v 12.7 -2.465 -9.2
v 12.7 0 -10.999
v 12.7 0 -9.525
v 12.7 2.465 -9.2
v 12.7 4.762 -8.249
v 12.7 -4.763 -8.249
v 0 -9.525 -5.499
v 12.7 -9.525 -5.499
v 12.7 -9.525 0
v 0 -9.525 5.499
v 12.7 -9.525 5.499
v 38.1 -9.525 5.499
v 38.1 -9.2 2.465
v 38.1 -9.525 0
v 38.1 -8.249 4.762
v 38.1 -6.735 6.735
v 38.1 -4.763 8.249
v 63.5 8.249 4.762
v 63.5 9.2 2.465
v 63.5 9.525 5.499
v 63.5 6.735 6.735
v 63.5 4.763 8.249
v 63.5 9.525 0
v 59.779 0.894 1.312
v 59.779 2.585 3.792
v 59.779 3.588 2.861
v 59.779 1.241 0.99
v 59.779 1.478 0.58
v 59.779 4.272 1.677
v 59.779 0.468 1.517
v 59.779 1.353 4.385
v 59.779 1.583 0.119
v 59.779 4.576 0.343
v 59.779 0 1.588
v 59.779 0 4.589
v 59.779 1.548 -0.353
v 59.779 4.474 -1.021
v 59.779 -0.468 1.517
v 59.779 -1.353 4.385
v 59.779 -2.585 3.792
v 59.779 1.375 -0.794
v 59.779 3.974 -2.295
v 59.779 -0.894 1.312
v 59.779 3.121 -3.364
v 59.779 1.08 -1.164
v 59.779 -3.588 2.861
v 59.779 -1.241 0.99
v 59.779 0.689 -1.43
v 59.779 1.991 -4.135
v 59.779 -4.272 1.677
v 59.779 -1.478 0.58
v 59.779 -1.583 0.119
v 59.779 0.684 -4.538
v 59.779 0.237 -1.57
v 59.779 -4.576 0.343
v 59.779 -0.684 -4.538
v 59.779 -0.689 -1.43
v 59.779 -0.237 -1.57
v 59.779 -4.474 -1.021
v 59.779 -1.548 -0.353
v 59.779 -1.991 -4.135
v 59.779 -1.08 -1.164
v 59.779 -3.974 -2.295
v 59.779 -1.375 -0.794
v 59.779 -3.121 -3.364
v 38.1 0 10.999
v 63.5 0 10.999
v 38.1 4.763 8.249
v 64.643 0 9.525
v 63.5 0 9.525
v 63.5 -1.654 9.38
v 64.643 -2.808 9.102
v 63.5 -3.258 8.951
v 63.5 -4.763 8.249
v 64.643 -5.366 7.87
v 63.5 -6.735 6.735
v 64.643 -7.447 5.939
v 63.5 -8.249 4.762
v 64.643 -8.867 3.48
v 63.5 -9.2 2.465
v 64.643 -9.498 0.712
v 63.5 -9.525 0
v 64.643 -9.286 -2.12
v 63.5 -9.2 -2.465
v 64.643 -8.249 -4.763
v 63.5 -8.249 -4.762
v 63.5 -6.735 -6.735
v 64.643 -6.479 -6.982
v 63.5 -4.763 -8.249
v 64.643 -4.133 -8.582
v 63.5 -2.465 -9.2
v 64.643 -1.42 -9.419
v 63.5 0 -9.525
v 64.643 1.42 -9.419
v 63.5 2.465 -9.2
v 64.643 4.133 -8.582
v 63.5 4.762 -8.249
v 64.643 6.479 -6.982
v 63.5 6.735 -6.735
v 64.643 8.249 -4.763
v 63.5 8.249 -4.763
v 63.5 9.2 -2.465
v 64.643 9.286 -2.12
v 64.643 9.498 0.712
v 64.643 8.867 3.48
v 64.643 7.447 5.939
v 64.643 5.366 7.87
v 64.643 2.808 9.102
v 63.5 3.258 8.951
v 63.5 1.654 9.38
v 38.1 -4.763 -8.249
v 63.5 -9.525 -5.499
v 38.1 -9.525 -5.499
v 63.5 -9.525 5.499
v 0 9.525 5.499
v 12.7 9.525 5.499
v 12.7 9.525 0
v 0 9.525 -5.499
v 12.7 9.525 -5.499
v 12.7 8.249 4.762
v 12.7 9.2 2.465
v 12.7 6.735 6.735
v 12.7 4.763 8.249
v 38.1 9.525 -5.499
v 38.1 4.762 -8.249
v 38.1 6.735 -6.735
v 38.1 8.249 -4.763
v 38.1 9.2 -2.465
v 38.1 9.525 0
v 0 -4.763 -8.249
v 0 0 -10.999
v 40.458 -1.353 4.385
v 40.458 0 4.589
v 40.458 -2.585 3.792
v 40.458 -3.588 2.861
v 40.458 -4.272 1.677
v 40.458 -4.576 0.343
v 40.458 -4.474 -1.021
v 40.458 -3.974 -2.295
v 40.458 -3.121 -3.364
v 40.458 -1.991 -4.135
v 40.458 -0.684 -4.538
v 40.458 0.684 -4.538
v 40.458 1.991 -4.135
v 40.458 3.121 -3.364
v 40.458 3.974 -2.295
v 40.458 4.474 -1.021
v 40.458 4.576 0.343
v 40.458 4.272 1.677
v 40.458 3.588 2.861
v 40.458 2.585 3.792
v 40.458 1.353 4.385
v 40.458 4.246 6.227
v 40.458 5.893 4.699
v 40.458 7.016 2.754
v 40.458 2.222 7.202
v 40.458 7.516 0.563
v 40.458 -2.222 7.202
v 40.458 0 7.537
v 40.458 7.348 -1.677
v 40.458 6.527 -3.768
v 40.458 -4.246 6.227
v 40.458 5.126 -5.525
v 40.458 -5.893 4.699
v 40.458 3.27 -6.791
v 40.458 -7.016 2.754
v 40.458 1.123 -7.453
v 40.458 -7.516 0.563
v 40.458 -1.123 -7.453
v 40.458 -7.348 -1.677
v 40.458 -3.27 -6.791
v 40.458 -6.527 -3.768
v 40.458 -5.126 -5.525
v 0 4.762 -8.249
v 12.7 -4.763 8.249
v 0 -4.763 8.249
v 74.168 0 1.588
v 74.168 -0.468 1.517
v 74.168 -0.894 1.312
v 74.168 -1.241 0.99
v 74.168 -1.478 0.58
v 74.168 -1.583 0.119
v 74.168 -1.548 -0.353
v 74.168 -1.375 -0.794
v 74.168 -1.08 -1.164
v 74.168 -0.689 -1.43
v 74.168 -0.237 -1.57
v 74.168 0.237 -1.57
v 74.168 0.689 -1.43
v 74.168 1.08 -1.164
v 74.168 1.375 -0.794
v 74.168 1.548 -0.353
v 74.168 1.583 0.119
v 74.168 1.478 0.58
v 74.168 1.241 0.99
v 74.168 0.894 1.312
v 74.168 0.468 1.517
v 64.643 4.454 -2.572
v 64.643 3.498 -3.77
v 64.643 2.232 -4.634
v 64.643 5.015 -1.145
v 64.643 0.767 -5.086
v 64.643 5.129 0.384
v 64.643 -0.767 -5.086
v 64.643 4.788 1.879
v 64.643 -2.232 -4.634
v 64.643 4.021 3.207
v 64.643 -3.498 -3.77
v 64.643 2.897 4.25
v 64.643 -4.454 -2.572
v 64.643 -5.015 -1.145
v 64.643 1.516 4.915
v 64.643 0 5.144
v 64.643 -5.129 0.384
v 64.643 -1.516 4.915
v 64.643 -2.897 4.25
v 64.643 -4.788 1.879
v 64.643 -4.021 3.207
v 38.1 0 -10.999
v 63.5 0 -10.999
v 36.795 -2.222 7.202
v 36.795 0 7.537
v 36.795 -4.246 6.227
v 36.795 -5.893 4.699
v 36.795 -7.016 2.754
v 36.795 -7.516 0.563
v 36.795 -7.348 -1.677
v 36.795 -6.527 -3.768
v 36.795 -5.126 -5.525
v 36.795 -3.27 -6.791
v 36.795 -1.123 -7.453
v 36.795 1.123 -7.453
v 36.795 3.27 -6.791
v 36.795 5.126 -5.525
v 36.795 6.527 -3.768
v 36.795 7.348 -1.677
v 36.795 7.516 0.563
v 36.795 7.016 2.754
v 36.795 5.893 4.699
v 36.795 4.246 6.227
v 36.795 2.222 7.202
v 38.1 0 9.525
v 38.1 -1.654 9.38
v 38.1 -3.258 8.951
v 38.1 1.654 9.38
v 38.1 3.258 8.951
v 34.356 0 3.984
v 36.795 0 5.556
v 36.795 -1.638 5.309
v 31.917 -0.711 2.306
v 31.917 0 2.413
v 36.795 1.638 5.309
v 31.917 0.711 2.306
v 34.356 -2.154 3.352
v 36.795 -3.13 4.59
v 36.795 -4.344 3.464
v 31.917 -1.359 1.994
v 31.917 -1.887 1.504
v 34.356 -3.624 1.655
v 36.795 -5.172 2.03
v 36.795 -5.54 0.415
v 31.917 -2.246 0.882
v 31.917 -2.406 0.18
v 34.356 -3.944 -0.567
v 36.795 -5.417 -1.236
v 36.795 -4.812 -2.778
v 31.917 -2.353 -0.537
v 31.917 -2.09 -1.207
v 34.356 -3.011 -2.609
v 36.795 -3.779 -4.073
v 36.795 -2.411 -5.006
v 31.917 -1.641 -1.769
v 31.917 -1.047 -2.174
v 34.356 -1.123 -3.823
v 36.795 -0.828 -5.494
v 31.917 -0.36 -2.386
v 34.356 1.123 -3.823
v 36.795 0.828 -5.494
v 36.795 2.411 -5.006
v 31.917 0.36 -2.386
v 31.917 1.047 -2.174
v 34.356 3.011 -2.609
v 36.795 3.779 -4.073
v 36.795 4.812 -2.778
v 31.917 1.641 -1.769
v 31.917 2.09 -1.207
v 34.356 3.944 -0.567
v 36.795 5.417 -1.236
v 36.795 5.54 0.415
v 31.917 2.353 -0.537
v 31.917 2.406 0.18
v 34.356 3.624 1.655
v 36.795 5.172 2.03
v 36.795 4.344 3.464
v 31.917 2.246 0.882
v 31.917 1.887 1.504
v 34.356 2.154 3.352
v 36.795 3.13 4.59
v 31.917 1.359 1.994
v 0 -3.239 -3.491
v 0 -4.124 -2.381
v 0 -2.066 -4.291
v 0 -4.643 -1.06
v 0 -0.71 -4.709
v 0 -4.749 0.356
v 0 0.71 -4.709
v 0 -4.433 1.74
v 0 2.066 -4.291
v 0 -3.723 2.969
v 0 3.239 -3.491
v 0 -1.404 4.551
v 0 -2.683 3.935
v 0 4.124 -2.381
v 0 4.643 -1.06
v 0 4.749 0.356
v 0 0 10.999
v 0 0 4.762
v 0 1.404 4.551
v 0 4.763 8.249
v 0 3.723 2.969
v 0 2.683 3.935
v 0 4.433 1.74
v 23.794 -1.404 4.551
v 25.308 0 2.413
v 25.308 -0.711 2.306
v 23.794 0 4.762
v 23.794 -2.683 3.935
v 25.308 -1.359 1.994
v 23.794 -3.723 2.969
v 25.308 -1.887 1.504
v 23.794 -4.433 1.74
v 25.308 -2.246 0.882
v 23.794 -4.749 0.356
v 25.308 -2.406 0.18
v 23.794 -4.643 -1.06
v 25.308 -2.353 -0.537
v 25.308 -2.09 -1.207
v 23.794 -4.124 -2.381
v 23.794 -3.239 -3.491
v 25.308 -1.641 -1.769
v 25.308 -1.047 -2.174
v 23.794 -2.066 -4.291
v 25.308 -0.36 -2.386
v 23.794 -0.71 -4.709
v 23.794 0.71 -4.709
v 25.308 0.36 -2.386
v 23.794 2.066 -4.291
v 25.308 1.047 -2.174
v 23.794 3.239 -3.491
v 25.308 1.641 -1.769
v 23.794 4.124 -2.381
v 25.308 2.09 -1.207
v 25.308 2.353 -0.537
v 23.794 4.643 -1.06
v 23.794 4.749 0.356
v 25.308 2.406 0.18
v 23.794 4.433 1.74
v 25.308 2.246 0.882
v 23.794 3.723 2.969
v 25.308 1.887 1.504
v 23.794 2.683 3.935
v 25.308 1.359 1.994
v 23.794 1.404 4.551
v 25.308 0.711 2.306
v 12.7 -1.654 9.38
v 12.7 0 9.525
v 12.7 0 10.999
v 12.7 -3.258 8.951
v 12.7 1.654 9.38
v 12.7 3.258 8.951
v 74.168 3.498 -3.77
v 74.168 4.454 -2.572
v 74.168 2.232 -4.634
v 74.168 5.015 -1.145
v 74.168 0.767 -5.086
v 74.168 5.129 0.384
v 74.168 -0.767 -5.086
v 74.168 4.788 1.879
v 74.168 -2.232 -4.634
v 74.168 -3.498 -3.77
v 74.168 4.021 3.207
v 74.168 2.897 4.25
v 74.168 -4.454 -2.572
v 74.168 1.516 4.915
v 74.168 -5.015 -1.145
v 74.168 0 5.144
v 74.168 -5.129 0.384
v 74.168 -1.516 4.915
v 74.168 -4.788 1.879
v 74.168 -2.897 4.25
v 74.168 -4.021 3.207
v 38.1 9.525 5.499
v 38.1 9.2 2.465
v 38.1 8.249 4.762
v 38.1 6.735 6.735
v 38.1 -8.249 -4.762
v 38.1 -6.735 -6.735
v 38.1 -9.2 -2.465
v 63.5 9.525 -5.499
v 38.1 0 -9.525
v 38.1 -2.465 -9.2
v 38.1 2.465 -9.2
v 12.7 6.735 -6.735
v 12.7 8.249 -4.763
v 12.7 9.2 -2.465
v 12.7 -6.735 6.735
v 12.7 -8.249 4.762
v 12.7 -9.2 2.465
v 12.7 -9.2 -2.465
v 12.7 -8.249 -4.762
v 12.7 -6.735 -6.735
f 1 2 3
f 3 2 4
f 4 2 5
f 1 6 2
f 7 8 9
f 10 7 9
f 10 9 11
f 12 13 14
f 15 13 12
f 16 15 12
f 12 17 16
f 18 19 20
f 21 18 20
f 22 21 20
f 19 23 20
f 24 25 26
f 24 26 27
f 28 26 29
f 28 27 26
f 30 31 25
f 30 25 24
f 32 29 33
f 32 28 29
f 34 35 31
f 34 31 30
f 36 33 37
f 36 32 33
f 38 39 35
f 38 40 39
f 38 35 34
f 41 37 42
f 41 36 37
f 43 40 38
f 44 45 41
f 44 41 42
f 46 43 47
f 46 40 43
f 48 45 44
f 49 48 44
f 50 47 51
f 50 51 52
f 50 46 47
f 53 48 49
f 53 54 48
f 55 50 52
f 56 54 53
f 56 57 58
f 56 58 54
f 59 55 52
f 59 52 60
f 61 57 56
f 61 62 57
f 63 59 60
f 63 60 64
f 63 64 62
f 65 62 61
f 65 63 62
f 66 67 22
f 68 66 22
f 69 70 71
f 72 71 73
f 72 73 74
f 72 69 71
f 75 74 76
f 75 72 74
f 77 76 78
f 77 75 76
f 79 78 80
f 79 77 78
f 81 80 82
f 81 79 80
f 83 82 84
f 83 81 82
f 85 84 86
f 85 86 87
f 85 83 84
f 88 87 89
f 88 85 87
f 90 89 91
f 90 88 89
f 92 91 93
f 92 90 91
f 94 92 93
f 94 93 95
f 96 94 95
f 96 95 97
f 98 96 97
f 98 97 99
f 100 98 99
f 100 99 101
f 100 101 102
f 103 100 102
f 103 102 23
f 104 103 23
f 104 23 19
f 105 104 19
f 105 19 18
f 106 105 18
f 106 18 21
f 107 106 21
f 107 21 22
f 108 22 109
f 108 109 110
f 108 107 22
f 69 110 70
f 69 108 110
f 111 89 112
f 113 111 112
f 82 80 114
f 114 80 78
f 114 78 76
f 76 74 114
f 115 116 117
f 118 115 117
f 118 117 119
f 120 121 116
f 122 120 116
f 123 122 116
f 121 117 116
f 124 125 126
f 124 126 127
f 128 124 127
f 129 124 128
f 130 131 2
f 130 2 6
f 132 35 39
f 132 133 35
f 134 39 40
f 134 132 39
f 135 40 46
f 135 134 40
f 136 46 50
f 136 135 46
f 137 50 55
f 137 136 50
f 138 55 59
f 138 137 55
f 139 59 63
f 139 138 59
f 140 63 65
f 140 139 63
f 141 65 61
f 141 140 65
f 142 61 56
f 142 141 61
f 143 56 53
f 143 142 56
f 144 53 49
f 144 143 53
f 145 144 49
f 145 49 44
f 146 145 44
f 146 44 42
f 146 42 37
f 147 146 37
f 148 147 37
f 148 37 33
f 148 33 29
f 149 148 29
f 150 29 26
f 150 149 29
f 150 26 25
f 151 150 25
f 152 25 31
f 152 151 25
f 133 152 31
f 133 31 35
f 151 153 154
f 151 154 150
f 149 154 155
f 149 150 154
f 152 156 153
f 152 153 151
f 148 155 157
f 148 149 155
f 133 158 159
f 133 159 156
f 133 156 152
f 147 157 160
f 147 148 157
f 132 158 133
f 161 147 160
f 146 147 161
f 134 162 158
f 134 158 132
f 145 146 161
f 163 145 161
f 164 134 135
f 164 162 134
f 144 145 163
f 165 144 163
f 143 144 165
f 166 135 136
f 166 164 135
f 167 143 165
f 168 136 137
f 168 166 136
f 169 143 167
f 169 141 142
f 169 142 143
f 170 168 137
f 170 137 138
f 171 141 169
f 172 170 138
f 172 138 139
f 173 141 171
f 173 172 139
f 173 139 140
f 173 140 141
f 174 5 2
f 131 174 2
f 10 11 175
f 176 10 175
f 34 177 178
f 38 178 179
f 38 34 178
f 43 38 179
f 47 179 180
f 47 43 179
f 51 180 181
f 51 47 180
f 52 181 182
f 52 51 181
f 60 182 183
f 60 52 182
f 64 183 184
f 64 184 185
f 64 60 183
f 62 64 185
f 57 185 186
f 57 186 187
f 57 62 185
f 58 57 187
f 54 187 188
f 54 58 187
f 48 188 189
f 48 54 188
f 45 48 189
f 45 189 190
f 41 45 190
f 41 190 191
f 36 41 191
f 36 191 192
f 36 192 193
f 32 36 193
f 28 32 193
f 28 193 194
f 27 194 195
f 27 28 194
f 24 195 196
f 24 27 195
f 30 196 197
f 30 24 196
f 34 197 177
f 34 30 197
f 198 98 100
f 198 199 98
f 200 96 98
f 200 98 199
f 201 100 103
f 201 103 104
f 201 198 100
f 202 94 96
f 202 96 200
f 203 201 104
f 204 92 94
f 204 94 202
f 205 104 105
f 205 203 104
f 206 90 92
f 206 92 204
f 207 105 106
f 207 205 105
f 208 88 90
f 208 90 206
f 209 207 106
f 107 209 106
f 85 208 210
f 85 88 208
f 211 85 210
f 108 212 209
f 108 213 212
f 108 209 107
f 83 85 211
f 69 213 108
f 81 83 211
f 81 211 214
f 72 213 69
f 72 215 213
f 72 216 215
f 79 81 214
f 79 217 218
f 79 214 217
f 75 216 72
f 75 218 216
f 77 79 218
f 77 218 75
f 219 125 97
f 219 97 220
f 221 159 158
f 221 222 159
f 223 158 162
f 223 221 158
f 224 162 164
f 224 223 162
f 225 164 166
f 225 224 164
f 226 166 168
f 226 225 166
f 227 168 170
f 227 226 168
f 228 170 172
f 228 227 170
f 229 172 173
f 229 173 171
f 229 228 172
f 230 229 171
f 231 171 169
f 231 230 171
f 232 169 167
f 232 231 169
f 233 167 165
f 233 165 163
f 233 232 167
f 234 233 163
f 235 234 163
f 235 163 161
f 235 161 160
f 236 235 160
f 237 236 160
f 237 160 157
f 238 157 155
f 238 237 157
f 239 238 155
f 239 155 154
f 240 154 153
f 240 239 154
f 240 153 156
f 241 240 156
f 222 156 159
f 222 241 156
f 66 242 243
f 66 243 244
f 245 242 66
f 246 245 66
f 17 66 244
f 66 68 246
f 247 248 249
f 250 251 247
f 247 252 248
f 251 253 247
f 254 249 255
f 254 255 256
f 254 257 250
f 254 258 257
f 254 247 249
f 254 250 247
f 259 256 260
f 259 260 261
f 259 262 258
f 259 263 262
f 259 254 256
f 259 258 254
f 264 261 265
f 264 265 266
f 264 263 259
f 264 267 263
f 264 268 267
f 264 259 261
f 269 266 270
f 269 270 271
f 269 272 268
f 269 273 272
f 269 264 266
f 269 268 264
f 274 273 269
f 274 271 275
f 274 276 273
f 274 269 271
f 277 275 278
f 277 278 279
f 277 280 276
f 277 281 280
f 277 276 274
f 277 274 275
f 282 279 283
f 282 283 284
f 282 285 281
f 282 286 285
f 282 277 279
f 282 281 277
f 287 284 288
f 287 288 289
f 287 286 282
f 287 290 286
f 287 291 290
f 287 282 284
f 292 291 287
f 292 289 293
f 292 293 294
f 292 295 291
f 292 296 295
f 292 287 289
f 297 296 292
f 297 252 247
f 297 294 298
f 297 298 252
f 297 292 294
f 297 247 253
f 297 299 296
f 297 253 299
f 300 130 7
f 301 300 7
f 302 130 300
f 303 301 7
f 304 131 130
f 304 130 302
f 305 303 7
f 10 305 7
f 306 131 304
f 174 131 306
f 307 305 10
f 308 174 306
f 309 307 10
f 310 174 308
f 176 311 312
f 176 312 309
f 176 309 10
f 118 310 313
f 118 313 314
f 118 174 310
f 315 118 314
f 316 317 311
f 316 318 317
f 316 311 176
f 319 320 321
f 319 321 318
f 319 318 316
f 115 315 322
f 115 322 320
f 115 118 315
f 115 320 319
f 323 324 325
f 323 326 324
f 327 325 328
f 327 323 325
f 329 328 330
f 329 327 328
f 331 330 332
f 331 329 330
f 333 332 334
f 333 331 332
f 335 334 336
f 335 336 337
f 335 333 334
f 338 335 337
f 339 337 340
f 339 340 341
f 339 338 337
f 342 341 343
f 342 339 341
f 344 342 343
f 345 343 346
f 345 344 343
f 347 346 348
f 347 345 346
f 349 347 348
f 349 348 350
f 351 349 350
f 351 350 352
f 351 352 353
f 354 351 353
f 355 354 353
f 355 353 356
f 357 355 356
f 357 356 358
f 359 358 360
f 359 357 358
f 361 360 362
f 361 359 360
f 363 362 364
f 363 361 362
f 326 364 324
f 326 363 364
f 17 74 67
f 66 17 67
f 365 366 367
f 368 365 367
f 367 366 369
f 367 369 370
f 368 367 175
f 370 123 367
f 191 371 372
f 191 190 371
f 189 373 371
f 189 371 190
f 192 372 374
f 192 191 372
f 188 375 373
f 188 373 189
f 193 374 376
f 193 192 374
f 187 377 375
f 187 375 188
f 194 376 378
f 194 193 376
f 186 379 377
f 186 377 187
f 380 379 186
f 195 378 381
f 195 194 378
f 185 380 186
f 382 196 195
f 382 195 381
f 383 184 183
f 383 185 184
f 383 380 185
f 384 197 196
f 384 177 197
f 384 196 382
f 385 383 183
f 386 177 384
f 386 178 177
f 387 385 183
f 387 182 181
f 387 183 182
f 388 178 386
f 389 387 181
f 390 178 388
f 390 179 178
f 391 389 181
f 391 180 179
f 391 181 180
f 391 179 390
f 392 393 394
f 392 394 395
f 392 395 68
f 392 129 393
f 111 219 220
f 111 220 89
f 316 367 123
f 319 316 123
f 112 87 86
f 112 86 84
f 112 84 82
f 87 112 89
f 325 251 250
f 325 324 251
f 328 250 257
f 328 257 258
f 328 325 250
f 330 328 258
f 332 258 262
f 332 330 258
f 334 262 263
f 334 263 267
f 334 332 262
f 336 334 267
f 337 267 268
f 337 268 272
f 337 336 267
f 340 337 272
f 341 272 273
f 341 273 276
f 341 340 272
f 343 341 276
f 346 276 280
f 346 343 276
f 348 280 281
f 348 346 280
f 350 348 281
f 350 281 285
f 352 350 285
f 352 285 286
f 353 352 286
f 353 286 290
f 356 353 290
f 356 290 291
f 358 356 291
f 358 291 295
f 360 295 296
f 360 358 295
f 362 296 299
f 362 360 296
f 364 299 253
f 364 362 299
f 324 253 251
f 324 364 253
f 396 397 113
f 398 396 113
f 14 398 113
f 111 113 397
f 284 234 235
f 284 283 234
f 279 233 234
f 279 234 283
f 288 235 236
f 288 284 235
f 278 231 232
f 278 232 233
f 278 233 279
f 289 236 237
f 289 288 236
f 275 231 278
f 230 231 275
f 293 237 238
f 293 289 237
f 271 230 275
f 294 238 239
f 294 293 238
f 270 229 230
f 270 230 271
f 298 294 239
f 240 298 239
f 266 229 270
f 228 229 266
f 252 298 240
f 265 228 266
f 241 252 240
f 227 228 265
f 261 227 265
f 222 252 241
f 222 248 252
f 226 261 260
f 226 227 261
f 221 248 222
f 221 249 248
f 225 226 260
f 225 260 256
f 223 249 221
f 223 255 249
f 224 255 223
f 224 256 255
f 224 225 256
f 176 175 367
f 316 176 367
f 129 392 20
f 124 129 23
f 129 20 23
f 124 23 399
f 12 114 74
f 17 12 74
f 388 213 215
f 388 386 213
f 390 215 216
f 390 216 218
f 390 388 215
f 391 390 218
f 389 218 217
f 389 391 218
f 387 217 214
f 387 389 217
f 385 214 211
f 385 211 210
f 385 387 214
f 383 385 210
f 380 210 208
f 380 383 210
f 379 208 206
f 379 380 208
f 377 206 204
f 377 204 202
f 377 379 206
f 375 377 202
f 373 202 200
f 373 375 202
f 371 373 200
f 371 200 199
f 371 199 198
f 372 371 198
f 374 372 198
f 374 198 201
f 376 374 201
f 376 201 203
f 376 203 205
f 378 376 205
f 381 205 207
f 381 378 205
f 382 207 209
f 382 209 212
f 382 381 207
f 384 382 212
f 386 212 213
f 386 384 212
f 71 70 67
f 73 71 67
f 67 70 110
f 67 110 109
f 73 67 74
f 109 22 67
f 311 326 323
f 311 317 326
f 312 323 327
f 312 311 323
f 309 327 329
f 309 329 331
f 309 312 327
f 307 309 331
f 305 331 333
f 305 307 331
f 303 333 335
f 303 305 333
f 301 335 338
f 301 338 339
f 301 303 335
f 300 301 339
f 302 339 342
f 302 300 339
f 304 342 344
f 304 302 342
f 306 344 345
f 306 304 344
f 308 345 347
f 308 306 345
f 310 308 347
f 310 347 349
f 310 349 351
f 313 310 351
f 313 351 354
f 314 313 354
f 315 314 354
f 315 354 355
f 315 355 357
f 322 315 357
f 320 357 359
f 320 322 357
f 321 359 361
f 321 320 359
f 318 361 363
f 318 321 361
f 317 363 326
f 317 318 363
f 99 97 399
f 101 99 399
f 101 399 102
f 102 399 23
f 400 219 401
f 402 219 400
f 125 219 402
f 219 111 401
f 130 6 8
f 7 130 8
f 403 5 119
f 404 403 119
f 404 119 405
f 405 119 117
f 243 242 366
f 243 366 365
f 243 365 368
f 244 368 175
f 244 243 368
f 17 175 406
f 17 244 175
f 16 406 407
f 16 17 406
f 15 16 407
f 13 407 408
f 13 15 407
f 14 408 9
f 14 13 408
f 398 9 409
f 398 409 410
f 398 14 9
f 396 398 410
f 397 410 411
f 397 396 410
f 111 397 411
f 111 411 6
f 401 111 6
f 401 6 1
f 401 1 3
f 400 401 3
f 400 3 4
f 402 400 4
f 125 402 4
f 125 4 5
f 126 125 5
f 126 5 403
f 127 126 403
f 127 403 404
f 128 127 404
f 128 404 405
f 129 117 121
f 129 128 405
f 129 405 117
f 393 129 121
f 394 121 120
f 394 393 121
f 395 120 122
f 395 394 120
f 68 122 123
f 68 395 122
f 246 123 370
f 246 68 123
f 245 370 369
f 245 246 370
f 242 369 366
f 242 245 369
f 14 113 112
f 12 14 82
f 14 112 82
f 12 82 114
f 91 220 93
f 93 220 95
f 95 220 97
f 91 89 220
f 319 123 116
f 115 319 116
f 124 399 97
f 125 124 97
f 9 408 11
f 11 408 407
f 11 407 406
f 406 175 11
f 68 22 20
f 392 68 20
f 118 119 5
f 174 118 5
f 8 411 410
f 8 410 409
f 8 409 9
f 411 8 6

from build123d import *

# Parameters (mm, degrees)
BOSS_EXTRUDE1_START = -12.7
BOSS_EXTRUDE1_DEPTH = 12.7
BOSS_EXTRUDE2_START = -63.5
BOSS_EXTRUDE2_DEPTH = 25.4


with BuildPart() as part:
    # Sketch1 → Revolve1 (revolve)
    with BuildSketch(Plane.XY):
        Polygon((0, 9.525), (64.643, 9.525), (64.643, 5.1435), (74.168, 5.1435), (74.168, 1.5875), (59.77878359, 1.5875), (59.77878359, 4.58916283), (40.457949701, 4.58916283), (40.457949701, 7.536935058), (36.795436007, 7.536935058), (36.795436007, 5.555870047), (31.917498279, 2.413), (25.308223812, 2.413), (23.794433849, 4.7625), (0, 4.7625), align=None)
    revolve(axis=Axis((0, 0, 0), (1, 0, 0)))

    # Sketch8 → Boss-Extrude1 (add)
    with BuildSketch(Plane.ZY.offset(BOSS_EXTRUDE1_START)):
        with BuildLine():
            Line((-8.248892028, 4.762499902), (-10.998522628, 0))
            Line((-10.998522628, 0), (-8.248891917, -4.762500094))
            ThreePointArc((-8.248891917, -4.762500094), (-9.525, -1.11e-07), (-8.248892028, 4.762499902))
        make_face()
        with BuildLine():
            ThreePointArc((0, -9.525), (-4.762499953, -8.248891998), (-8.248891917, -4.762500094))
            Line((-8.248891917, -4.762500094), (-5.499261314, -9.525))
            Line((-5.499261314, -9.525), (0, -9.525))
        make_face()
        with BuildLine():
            Line((-5.499261314, 9.525), (-8.248892028, 4.762499902))
            ThreePointArc((-8.248892028, 4.762499902), (-4.762500049, 8.248891943), (0, 9.525))
            Line((0, 9.525), (-5.499261314, 9.525))
        make_face()
        with BuildLine():
            ThreePointArc((8.248891846, -4.762500216), (4.762499892, -8.248892033), (0, -9.525))
            Line((0, -9.525), (5.499261314, -9.525))
            Line((5.499261314, -9.525), (8.248891846, -4.762500216))
        make_face()
        with BuildLine():
            Line((5.499261314, 9.525), (0, 9.525))
            ThreePointArc((0, 9.525), (4.762499953, 8.248891998), (8.248891917, 4.762500094))
            Line((8.248891917, 4.762500094), (5.499261314, 9.525))
        make_face()
        with BuildLine():
            ThreePointArc((8.248891917, 4.762500094), (9.525, -7.1e-08), (8.248891846, -4.762500216))
            Line((8.248891846, -4.762500216), (10.998522628, 0))
            Line((10.998522628, 0), (8.248891917, 4.762500094))
        make_face()
    extrude(amount=BOSS_EXTRUDE1_DEPTH)

    # Sketch8<3> → Boss-Extrude2 (add)
    with BuildSketch(Plane.ZY.offset(BOSS_EXTRUDE2_START)):
        with BuildLine():
            Line((-8.248892028, 4.762499902), (-10.998522628, 0))
            Line((-10.998522628, 0), (-8.248891917, -4.762500094))
            ThreePointArc((-8.248891917, -4.762500094), (-9.525, -1.11e-07), (-8.248892028, 4.762499902))
        make_face()
        with BuildLine():
            ThreePointArc((0, -9.525), (-4.762499953, -8.248891998), (-8.248891917, -4.762500094))
            Line((-8.248891917, -4.762500094), (-5.499261314, -9.525))
            Line((-5.499261314, -9.525), (0, -9.525))
        make_face()
        with BuildLine():
            Line((-5.499261314, 9.525), (-8.248892028, 4.762499902))
            ThreePointArc((-8.248892028, 4.762499902), (-4.762500049, 8.248891943), (0, 9.525))
            Line((0, 9.525), (-5.499261314, 9.525))
        make_face()
        with BuildLine():
            ThreePointArc((8.248891846, -4.762500216), (4.762499892, -8.248892033), (0, -9.525))
            Line((0, -9.525), (5.499261314, -9.525))
            Line((5.499261314, -9.525), (8.248891846, -4.762500216))
        make_face()
        with BuildLine():
            Line((5.499261314, 9.525), (0, 9.525))
            ThreePointArc((0, 9.525), (4.762499953, 8.248891998), (8.248891917, 4.762500094))
            Line((8.248891917, 4.762500094), (5.499261314, 9.525))
        make_face()
        with BuildLine():
            ThreePointArc((8.248891917, 4.762500094), (9.525, -7.1e-08), (8.248891846, -4.762500216))
            Line((8.248891846, -4.762500216), (10.998522628, 0))
            Line((10.998522628, 0), (8.248891917, 4.762500094))
        make_face()
    extrude(amount=BOSS_EXTRUDE2_DEPTH)


solid = part.part
